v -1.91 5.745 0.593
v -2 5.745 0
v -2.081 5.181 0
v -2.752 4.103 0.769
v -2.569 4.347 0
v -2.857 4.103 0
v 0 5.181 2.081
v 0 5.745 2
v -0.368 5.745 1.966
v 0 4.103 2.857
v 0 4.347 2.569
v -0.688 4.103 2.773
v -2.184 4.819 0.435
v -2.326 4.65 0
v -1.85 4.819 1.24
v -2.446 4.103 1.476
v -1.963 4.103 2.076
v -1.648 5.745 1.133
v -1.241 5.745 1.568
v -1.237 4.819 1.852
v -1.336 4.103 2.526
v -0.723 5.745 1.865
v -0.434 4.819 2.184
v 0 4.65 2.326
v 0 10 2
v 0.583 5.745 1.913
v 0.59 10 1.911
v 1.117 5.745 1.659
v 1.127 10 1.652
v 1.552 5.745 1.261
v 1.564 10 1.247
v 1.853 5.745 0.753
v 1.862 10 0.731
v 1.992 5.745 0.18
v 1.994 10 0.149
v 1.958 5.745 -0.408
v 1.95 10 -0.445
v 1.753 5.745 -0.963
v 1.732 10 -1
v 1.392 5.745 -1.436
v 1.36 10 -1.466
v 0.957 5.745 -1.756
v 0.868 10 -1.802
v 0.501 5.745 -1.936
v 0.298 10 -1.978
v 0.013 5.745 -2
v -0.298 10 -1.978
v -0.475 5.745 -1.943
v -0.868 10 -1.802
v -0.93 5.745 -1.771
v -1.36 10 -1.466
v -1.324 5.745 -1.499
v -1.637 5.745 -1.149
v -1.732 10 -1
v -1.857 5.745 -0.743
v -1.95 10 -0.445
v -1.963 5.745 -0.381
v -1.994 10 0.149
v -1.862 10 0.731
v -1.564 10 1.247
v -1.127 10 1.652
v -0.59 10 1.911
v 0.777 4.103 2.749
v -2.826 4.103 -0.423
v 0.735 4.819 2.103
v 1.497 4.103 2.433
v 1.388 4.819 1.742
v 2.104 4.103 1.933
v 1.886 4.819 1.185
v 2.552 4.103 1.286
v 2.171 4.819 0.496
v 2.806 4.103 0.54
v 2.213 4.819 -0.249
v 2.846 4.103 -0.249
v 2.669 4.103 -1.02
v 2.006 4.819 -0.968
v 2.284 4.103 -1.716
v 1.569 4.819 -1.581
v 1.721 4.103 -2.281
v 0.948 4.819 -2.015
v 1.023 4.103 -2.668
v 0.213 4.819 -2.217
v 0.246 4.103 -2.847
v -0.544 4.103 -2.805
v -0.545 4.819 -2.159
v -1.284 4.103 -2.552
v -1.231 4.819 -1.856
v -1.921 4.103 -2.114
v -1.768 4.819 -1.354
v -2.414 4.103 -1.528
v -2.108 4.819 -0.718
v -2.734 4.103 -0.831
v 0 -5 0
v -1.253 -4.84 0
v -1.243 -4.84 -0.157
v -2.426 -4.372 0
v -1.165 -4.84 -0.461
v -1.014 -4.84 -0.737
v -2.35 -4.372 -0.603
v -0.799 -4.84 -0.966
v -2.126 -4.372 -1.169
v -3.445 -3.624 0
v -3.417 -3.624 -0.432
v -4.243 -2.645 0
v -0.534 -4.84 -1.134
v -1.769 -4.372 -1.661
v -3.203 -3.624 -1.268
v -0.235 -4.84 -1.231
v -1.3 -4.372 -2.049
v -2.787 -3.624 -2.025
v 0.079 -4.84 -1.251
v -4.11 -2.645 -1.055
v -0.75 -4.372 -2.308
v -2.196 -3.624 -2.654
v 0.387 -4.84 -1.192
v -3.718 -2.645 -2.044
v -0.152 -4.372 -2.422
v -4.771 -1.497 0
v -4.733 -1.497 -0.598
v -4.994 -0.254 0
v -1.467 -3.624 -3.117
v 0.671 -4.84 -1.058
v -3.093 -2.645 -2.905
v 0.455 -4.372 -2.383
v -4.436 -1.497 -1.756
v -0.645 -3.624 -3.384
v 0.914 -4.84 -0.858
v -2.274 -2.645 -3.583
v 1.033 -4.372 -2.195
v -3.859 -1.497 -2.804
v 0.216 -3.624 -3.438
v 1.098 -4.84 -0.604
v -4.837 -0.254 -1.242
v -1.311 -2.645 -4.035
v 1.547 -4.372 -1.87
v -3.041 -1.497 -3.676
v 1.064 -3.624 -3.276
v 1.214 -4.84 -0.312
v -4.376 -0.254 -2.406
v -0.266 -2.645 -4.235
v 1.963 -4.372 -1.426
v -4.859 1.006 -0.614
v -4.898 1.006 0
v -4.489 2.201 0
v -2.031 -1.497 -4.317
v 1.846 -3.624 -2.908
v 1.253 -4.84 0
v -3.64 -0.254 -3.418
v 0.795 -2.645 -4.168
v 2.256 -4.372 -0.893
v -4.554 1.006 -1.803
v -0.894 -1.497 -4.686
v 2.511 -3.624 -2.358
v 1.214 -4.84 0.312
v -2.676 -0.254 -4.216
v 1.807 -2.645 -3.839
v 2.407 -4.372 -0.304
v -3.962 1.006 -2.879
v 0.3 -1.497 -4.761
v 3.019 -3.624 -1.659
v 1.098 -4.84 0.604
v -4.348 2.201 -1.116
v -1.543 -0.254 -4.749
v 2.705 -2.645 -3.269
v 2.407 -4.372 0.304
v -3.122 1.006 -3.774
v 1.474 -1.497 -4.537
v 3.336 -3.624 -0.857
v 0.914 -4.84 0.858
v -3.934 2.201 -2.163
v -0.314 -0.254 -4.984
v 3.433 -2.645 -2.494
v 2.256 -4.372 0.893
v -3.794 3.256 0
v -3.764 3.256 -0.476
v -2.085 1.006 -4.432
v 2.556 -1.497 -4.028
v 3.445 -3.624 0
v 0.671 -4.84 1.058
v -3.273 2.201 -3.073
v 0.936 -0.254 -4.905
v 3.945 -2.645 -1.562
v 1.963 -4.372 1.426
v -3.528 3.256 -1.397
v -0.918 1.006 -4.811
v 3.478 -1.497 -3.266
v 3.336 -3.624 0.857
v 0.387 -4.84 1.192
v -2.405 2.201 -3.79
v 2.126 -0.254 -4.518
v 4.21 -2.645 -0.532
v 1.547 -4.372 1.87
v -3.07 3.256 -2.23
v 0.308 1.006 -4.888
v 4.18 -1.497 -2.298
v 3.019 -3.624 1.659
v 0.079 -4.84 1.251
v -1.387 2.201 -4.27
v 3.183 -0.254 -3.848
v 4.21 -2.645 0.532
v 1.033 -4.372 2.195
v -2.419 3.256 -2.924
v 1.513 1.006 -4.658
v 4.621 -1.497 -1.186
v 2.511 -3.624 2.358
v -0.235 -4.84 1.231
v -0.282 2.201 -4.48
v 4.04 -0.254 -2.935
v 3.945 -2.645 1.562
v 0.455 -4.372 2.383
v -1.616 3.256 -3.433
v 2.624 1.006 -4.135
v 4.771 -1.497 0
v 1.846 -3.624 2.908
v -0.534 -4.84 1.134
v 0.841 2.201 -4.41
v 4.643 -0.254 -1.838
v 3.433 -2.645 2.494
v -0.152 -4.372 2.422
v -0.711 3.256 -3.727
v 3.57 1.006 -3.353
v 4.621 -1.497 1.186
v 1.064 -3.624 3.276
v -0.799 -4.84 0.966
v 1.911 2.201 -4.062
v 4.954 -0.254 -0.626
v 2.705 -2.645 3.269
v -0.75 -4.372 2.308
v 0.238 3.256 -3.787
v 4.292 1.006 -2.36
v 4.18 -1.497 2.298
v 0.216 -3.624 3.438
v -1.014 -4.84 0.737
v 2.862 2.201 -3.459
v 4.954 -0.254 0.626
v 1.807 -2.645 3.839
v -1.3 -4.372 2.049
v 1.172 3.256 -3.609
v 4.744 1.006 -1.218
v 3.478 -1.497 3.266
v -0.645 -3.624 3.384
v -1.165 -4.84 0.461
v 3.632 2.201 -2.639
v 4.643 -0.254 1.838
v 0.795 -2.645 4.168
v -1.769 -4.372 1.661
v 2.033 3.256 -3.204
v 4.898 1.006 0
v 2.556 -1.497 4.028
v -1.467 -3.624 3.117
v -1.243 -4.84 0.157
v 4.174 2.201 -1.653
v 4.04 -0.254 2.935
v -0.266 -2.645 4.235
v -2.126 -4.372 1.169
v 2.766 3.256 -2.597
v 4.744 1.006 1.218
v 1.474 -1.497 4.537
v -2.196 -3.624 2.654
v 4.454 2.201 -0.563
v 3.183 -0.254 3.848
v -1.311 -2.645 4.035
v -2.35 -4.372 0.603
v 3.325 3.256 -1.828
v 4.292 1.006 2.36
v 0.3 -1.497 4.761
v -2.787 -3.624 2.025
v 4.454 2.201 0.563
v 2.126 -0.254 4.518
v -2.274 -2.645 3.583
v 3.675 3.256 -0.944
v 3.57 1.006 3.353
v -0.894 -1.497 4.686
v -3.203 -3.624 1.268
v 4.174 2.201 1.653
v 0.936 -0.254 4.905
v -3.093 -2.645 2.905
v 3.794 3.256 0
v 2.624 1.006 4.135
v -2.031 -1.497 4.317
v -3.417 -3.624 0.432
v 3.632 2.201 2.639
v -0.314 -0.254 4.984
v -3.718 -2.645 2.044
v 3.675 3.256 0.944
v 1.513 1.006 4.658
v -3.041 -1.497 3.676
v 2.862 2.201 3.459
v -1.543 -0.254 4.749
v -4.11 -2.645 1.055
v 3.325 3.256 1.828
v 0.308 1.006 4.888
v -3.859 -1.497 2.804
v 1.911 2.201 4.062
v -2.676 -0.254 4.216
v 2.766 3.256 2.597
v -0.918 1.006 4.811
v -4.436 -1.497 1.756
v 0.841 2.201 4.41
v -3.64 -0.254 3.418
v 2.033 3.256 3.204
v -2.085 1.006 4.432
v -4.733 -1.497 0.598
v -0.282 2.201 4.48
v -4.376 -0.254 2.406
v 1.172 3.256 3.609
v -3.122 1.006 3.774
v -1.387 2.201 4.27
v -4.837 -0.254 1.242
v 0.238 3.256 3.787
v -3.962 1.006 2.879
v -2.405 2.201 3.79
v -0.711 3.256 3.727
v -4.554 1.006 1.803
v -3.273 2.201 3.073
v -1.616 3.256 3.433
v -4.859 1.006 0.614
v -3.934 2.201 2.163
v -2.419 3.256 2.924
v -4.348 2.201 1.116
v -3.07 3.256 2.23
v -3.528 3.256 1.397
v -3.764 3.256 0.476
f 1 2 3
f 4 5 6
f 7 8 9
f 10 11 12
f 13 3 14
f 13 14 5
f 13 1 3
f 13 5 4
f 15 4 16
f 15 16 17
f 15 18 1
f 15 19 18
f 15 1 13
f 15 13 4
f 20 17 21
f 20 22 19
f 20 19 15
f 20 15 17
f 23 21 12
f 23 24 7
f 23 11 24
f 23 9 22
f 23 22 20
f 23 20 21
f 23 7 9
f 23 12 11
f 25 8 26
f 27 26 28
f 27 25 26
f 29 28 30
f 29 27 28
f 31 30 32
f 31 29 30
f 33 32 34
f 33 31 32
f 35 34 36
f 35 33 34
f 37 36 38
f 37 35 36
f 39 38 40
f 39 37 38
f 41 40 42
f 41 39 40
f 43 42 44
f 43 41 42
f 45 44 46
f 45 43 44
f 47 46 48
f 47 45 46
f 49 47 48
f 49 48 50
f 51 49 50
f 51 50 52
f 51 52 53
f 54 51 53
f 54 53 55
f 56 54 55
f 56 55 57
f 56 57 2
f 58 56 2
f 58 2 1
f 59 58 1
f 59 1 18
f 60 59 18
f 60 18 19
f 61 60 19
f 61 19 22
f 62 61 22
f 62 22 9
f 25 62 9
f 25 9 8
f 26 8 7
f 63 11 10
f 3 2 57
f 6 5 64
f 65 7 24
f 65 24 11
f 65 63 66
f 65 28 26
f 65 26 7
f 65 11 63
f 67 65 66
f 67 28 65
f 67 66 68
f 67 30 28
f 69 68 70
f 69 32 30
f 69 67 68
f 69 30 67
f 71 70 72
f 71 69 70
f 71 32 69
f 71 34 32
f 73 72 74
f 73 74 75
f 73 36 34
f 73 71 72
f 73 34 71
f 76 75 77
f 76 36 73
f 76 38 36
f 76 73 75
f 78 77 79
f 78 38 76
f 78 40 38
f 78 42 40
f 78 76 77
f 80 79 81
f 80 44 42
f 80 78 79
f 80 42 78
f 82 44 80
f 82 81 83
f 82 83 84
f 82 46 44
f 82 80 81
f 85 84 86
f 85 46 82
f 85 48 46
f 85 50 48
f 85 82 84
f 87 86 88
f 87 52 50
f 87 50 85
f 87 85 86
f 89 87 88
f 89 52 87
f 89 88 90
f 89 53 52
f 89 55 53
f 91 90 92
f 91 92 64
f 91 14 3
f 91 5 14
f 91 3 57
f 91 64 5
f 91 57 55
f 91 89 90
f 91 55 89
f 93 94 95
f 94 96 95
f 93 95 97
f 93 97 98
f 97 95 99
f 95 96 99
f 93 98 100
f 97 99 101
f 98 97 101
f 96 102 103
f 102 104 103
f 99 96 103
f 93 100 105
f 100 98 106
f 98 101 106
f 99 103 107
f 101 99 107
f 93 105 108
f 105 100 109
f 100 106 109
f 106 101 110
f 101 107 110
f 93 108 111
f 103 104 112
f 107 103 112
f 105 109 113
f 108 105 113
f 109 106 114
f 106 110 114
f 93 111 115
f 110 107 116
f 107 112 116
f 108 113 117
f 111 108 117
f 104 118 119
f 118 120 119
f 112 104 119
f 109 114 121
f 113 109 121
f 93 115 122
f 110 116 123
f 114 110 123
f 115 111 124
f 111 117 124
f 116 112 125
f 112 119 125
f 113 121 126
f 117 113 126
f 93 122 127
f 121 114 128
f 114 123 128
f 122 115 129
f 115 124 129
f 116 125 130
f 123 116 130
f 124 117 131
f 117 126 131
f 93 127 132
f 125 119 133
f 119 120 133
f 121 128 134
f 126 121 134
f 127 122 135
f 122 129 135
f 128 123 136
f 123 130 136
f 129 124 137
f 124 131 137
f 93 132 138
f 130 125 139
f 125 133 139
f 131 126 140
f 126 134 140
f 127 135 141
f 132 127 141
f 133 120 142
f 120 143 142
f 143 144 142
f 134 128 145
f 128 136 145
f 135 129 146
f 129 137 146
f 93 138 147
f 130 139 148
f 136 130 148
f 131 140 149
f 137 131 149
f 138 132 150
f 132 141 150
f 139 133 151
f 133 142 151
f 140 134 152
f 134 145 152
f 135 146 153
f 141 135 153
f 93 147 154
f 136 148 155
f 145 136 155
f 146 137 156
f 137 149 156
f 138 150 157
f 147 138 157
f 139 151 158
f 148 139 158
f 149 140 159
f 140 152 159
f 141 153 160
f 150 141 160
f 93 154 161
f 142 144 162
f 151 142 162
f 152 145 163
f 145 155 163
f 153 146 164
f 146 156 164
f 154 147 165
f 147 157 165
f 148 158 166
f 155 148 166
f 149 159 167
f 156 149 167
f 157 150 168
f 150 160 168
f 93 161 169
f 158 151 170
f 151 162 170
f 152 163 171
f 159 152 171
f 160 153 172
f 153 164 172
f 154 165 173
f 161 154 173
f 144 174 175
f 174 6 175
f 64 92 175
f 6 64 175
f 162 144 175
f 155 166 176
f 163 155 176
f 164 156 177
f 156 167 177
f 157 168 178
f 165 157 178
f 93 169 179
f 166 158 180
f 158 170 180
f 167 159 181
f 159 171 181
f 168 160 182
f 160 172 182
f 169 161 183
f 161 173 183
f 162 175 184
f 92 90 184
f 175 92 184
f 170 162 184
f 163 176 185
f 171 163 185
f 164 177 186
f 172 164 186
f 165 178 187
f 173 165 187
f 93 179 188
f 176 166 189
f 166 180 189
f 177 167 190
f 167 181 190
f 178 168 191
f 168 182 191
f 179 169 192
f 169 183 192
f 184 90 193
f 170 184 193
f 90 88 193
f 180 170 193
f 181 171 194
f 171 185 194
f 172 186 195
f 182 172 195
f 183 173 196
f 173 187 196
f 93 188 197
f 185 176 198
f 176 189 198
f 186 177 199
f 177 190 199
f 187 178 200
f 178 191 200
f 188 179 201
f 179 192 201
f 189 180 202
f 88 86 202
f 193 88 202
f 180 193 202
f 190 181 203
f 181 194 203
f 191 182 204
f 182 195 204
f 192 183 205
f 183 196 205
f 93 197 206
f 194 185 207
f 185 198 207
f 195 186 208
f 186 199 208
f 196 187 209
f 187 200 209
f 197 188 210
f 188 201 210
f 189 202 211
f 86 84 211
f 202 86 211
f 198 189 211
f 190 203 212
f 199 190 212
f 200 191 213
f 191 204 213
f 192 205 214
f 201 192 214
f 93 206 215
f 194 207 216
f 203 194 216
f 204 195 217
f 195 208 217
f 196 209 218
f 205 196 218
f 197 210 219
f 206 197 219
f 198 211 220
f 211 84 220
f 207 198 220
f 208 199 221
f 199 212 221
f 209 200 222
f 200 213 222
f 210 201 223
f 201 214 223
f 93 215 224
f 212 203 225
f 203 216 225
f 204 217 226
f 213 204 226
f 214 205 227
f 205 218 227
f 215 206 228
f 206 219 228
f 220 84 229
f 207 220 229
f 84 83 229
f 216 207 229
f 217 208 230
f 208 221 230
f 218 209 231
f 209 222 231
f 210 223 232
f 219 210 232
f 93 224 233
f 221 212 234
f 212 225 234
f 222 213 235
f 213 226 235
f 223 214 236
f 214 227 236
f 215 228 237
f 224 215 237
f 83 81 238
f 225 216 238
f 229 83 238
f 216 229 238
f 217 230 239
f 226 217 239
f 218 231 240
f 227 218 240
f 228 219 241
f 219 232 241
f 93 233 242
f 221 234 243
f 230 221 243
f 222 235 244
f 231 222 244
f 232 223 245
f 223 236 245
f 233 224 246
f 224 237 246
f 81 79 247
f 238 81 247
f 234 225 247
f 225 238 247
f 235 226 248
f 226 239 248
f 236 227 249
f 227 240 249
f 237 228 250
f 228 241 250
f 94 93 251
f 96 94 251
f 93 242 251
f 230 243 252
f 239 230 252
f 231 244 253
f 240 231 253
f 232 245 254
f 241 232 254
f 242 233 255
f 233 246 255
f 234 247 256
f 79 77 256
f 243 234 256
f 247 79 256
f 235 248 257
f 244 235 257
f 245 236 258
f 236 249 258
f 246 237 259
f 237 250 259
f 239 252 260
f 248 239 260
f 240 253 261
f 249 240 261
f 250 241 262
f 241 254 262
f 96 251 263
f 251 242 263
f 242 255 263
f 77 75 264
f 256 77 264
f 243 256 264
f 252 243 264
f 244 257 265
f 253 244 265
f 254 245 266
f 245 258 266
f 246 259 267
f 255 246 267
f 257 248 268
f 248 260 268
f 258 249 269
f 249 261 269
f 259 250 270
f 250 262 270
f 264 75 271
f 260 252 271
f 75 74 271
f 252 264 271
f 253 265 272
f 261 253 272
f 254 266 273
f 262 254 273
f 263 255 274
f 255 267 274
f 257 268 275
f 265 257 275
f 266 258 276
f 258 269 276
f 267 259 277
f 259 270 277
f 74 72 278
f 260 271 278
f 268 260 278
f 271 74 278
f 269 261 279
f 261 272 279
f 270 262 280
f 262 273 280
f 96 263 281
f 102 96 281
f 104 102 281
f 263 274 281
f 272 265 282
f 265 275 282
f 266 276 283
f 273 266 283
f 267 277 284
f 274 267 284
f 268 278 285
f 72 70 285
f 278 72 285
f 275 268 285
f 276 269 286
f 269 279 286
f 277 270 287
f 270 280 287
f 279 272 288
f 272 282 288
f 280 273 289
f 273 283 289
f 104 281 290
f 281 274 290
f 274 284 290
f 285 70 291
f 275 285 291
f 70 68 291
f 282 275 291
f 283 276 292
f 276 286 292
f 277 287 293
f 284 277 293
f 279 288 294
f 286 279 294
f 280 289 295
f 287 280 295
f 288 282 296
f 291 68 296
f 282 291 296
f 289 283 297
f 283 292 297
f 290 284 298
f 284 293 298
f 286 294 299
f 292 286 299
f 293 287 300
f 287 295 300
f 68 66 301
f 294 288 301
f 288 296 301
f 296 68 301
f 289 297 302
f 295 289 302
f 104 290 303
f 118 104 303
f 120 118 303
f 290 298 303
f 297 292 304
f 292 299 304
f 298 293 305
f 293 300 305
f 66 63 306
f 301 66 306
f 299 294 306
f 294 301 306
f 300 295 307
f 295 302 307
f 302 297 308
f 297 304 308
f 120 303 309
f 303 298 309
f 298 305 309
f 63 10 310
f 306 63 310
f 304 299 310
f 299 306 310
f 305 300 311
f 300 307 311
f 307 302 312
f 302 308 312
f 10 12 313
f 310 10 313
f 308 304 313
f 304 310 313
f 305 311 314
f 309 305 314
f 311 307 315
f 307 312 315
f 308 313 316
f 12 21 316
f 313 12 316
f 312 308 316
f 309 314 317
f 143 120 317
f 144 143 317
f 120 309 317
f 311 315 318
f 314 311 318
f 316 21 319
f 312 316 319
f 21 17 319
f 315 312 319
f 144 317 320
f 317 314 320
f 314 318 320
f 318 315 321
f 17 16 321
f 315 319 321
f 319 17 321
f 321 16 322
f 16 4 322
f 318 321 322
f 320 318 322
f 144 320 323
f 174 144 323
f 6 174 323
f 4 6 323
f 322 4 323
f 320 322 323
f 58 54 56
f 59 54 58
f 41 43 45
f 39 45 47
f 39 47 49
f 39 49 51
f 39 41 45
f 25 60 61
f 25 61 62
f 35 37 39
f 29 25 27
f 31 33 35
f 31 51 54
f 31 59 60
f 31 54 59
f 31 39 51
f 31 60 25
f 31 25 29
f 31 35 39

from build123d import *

# Parameters (mm, degrees)
BOSS_EXTRUDE2_REACH      = 18.583
BOSS_EXTRUDE2_END_RADIUS = 5
SKETCH2_R                = 2
FILLET1_R                = 2


with BuildPart() as part:
    # Sketch1 → Revolve1 (revolve)
    with BuildSketch(Plane.XY):
        with BuildLine():
            Line((0, 5), (0, -5))
            ThreePointArc((0, -5), (-5, 0), (0, 5))
        make_face()
    revolve(axis=Axis((0, 5, 0), (0, -1, 0)))

    # Boss-Extrude2: up to this sphere (the profile starts outside it)
    boss_extrude2_end = Location((0, 0, 0)) * Sphere(BOSS_EXTRUDE2_END_RADIUS, mode=Mode.PRIVATE)
    # Sketch2 → Boss-Extrude2 (add, up to the surface)
    with BuildSketch(Plane(origin=(0, 10, 0), x_dir=(1, 0, 0), z_dir=(0, 1, 0)), mode=Mode.PRIVATE) as boss_extrude2_sk1:
        with Locations(Location((0, 0, 0), (0, 0, 270))):
            Circle(SKETCH2_R)
    boss_extrude2_tool1 = extrude(boss_extrude2_sk1.sketch, amount=-BOSS_EXTRUDE2_REACH, mode=Mode.PRIVATE) - boss_extrude2_end
    add(boss_extrude2_tool1.solids().sort_by_distance((0, 10, 0))[0])

    # Fillet1
    fillet1_edges = [part.edges().sort_by_distance(p)[0] for p in [
        (1.414213562, 4.582575695, -1.414213562),
    ]]
    fillet(fillet1_edges, radius=FILLET1_R)


solid = part.part
